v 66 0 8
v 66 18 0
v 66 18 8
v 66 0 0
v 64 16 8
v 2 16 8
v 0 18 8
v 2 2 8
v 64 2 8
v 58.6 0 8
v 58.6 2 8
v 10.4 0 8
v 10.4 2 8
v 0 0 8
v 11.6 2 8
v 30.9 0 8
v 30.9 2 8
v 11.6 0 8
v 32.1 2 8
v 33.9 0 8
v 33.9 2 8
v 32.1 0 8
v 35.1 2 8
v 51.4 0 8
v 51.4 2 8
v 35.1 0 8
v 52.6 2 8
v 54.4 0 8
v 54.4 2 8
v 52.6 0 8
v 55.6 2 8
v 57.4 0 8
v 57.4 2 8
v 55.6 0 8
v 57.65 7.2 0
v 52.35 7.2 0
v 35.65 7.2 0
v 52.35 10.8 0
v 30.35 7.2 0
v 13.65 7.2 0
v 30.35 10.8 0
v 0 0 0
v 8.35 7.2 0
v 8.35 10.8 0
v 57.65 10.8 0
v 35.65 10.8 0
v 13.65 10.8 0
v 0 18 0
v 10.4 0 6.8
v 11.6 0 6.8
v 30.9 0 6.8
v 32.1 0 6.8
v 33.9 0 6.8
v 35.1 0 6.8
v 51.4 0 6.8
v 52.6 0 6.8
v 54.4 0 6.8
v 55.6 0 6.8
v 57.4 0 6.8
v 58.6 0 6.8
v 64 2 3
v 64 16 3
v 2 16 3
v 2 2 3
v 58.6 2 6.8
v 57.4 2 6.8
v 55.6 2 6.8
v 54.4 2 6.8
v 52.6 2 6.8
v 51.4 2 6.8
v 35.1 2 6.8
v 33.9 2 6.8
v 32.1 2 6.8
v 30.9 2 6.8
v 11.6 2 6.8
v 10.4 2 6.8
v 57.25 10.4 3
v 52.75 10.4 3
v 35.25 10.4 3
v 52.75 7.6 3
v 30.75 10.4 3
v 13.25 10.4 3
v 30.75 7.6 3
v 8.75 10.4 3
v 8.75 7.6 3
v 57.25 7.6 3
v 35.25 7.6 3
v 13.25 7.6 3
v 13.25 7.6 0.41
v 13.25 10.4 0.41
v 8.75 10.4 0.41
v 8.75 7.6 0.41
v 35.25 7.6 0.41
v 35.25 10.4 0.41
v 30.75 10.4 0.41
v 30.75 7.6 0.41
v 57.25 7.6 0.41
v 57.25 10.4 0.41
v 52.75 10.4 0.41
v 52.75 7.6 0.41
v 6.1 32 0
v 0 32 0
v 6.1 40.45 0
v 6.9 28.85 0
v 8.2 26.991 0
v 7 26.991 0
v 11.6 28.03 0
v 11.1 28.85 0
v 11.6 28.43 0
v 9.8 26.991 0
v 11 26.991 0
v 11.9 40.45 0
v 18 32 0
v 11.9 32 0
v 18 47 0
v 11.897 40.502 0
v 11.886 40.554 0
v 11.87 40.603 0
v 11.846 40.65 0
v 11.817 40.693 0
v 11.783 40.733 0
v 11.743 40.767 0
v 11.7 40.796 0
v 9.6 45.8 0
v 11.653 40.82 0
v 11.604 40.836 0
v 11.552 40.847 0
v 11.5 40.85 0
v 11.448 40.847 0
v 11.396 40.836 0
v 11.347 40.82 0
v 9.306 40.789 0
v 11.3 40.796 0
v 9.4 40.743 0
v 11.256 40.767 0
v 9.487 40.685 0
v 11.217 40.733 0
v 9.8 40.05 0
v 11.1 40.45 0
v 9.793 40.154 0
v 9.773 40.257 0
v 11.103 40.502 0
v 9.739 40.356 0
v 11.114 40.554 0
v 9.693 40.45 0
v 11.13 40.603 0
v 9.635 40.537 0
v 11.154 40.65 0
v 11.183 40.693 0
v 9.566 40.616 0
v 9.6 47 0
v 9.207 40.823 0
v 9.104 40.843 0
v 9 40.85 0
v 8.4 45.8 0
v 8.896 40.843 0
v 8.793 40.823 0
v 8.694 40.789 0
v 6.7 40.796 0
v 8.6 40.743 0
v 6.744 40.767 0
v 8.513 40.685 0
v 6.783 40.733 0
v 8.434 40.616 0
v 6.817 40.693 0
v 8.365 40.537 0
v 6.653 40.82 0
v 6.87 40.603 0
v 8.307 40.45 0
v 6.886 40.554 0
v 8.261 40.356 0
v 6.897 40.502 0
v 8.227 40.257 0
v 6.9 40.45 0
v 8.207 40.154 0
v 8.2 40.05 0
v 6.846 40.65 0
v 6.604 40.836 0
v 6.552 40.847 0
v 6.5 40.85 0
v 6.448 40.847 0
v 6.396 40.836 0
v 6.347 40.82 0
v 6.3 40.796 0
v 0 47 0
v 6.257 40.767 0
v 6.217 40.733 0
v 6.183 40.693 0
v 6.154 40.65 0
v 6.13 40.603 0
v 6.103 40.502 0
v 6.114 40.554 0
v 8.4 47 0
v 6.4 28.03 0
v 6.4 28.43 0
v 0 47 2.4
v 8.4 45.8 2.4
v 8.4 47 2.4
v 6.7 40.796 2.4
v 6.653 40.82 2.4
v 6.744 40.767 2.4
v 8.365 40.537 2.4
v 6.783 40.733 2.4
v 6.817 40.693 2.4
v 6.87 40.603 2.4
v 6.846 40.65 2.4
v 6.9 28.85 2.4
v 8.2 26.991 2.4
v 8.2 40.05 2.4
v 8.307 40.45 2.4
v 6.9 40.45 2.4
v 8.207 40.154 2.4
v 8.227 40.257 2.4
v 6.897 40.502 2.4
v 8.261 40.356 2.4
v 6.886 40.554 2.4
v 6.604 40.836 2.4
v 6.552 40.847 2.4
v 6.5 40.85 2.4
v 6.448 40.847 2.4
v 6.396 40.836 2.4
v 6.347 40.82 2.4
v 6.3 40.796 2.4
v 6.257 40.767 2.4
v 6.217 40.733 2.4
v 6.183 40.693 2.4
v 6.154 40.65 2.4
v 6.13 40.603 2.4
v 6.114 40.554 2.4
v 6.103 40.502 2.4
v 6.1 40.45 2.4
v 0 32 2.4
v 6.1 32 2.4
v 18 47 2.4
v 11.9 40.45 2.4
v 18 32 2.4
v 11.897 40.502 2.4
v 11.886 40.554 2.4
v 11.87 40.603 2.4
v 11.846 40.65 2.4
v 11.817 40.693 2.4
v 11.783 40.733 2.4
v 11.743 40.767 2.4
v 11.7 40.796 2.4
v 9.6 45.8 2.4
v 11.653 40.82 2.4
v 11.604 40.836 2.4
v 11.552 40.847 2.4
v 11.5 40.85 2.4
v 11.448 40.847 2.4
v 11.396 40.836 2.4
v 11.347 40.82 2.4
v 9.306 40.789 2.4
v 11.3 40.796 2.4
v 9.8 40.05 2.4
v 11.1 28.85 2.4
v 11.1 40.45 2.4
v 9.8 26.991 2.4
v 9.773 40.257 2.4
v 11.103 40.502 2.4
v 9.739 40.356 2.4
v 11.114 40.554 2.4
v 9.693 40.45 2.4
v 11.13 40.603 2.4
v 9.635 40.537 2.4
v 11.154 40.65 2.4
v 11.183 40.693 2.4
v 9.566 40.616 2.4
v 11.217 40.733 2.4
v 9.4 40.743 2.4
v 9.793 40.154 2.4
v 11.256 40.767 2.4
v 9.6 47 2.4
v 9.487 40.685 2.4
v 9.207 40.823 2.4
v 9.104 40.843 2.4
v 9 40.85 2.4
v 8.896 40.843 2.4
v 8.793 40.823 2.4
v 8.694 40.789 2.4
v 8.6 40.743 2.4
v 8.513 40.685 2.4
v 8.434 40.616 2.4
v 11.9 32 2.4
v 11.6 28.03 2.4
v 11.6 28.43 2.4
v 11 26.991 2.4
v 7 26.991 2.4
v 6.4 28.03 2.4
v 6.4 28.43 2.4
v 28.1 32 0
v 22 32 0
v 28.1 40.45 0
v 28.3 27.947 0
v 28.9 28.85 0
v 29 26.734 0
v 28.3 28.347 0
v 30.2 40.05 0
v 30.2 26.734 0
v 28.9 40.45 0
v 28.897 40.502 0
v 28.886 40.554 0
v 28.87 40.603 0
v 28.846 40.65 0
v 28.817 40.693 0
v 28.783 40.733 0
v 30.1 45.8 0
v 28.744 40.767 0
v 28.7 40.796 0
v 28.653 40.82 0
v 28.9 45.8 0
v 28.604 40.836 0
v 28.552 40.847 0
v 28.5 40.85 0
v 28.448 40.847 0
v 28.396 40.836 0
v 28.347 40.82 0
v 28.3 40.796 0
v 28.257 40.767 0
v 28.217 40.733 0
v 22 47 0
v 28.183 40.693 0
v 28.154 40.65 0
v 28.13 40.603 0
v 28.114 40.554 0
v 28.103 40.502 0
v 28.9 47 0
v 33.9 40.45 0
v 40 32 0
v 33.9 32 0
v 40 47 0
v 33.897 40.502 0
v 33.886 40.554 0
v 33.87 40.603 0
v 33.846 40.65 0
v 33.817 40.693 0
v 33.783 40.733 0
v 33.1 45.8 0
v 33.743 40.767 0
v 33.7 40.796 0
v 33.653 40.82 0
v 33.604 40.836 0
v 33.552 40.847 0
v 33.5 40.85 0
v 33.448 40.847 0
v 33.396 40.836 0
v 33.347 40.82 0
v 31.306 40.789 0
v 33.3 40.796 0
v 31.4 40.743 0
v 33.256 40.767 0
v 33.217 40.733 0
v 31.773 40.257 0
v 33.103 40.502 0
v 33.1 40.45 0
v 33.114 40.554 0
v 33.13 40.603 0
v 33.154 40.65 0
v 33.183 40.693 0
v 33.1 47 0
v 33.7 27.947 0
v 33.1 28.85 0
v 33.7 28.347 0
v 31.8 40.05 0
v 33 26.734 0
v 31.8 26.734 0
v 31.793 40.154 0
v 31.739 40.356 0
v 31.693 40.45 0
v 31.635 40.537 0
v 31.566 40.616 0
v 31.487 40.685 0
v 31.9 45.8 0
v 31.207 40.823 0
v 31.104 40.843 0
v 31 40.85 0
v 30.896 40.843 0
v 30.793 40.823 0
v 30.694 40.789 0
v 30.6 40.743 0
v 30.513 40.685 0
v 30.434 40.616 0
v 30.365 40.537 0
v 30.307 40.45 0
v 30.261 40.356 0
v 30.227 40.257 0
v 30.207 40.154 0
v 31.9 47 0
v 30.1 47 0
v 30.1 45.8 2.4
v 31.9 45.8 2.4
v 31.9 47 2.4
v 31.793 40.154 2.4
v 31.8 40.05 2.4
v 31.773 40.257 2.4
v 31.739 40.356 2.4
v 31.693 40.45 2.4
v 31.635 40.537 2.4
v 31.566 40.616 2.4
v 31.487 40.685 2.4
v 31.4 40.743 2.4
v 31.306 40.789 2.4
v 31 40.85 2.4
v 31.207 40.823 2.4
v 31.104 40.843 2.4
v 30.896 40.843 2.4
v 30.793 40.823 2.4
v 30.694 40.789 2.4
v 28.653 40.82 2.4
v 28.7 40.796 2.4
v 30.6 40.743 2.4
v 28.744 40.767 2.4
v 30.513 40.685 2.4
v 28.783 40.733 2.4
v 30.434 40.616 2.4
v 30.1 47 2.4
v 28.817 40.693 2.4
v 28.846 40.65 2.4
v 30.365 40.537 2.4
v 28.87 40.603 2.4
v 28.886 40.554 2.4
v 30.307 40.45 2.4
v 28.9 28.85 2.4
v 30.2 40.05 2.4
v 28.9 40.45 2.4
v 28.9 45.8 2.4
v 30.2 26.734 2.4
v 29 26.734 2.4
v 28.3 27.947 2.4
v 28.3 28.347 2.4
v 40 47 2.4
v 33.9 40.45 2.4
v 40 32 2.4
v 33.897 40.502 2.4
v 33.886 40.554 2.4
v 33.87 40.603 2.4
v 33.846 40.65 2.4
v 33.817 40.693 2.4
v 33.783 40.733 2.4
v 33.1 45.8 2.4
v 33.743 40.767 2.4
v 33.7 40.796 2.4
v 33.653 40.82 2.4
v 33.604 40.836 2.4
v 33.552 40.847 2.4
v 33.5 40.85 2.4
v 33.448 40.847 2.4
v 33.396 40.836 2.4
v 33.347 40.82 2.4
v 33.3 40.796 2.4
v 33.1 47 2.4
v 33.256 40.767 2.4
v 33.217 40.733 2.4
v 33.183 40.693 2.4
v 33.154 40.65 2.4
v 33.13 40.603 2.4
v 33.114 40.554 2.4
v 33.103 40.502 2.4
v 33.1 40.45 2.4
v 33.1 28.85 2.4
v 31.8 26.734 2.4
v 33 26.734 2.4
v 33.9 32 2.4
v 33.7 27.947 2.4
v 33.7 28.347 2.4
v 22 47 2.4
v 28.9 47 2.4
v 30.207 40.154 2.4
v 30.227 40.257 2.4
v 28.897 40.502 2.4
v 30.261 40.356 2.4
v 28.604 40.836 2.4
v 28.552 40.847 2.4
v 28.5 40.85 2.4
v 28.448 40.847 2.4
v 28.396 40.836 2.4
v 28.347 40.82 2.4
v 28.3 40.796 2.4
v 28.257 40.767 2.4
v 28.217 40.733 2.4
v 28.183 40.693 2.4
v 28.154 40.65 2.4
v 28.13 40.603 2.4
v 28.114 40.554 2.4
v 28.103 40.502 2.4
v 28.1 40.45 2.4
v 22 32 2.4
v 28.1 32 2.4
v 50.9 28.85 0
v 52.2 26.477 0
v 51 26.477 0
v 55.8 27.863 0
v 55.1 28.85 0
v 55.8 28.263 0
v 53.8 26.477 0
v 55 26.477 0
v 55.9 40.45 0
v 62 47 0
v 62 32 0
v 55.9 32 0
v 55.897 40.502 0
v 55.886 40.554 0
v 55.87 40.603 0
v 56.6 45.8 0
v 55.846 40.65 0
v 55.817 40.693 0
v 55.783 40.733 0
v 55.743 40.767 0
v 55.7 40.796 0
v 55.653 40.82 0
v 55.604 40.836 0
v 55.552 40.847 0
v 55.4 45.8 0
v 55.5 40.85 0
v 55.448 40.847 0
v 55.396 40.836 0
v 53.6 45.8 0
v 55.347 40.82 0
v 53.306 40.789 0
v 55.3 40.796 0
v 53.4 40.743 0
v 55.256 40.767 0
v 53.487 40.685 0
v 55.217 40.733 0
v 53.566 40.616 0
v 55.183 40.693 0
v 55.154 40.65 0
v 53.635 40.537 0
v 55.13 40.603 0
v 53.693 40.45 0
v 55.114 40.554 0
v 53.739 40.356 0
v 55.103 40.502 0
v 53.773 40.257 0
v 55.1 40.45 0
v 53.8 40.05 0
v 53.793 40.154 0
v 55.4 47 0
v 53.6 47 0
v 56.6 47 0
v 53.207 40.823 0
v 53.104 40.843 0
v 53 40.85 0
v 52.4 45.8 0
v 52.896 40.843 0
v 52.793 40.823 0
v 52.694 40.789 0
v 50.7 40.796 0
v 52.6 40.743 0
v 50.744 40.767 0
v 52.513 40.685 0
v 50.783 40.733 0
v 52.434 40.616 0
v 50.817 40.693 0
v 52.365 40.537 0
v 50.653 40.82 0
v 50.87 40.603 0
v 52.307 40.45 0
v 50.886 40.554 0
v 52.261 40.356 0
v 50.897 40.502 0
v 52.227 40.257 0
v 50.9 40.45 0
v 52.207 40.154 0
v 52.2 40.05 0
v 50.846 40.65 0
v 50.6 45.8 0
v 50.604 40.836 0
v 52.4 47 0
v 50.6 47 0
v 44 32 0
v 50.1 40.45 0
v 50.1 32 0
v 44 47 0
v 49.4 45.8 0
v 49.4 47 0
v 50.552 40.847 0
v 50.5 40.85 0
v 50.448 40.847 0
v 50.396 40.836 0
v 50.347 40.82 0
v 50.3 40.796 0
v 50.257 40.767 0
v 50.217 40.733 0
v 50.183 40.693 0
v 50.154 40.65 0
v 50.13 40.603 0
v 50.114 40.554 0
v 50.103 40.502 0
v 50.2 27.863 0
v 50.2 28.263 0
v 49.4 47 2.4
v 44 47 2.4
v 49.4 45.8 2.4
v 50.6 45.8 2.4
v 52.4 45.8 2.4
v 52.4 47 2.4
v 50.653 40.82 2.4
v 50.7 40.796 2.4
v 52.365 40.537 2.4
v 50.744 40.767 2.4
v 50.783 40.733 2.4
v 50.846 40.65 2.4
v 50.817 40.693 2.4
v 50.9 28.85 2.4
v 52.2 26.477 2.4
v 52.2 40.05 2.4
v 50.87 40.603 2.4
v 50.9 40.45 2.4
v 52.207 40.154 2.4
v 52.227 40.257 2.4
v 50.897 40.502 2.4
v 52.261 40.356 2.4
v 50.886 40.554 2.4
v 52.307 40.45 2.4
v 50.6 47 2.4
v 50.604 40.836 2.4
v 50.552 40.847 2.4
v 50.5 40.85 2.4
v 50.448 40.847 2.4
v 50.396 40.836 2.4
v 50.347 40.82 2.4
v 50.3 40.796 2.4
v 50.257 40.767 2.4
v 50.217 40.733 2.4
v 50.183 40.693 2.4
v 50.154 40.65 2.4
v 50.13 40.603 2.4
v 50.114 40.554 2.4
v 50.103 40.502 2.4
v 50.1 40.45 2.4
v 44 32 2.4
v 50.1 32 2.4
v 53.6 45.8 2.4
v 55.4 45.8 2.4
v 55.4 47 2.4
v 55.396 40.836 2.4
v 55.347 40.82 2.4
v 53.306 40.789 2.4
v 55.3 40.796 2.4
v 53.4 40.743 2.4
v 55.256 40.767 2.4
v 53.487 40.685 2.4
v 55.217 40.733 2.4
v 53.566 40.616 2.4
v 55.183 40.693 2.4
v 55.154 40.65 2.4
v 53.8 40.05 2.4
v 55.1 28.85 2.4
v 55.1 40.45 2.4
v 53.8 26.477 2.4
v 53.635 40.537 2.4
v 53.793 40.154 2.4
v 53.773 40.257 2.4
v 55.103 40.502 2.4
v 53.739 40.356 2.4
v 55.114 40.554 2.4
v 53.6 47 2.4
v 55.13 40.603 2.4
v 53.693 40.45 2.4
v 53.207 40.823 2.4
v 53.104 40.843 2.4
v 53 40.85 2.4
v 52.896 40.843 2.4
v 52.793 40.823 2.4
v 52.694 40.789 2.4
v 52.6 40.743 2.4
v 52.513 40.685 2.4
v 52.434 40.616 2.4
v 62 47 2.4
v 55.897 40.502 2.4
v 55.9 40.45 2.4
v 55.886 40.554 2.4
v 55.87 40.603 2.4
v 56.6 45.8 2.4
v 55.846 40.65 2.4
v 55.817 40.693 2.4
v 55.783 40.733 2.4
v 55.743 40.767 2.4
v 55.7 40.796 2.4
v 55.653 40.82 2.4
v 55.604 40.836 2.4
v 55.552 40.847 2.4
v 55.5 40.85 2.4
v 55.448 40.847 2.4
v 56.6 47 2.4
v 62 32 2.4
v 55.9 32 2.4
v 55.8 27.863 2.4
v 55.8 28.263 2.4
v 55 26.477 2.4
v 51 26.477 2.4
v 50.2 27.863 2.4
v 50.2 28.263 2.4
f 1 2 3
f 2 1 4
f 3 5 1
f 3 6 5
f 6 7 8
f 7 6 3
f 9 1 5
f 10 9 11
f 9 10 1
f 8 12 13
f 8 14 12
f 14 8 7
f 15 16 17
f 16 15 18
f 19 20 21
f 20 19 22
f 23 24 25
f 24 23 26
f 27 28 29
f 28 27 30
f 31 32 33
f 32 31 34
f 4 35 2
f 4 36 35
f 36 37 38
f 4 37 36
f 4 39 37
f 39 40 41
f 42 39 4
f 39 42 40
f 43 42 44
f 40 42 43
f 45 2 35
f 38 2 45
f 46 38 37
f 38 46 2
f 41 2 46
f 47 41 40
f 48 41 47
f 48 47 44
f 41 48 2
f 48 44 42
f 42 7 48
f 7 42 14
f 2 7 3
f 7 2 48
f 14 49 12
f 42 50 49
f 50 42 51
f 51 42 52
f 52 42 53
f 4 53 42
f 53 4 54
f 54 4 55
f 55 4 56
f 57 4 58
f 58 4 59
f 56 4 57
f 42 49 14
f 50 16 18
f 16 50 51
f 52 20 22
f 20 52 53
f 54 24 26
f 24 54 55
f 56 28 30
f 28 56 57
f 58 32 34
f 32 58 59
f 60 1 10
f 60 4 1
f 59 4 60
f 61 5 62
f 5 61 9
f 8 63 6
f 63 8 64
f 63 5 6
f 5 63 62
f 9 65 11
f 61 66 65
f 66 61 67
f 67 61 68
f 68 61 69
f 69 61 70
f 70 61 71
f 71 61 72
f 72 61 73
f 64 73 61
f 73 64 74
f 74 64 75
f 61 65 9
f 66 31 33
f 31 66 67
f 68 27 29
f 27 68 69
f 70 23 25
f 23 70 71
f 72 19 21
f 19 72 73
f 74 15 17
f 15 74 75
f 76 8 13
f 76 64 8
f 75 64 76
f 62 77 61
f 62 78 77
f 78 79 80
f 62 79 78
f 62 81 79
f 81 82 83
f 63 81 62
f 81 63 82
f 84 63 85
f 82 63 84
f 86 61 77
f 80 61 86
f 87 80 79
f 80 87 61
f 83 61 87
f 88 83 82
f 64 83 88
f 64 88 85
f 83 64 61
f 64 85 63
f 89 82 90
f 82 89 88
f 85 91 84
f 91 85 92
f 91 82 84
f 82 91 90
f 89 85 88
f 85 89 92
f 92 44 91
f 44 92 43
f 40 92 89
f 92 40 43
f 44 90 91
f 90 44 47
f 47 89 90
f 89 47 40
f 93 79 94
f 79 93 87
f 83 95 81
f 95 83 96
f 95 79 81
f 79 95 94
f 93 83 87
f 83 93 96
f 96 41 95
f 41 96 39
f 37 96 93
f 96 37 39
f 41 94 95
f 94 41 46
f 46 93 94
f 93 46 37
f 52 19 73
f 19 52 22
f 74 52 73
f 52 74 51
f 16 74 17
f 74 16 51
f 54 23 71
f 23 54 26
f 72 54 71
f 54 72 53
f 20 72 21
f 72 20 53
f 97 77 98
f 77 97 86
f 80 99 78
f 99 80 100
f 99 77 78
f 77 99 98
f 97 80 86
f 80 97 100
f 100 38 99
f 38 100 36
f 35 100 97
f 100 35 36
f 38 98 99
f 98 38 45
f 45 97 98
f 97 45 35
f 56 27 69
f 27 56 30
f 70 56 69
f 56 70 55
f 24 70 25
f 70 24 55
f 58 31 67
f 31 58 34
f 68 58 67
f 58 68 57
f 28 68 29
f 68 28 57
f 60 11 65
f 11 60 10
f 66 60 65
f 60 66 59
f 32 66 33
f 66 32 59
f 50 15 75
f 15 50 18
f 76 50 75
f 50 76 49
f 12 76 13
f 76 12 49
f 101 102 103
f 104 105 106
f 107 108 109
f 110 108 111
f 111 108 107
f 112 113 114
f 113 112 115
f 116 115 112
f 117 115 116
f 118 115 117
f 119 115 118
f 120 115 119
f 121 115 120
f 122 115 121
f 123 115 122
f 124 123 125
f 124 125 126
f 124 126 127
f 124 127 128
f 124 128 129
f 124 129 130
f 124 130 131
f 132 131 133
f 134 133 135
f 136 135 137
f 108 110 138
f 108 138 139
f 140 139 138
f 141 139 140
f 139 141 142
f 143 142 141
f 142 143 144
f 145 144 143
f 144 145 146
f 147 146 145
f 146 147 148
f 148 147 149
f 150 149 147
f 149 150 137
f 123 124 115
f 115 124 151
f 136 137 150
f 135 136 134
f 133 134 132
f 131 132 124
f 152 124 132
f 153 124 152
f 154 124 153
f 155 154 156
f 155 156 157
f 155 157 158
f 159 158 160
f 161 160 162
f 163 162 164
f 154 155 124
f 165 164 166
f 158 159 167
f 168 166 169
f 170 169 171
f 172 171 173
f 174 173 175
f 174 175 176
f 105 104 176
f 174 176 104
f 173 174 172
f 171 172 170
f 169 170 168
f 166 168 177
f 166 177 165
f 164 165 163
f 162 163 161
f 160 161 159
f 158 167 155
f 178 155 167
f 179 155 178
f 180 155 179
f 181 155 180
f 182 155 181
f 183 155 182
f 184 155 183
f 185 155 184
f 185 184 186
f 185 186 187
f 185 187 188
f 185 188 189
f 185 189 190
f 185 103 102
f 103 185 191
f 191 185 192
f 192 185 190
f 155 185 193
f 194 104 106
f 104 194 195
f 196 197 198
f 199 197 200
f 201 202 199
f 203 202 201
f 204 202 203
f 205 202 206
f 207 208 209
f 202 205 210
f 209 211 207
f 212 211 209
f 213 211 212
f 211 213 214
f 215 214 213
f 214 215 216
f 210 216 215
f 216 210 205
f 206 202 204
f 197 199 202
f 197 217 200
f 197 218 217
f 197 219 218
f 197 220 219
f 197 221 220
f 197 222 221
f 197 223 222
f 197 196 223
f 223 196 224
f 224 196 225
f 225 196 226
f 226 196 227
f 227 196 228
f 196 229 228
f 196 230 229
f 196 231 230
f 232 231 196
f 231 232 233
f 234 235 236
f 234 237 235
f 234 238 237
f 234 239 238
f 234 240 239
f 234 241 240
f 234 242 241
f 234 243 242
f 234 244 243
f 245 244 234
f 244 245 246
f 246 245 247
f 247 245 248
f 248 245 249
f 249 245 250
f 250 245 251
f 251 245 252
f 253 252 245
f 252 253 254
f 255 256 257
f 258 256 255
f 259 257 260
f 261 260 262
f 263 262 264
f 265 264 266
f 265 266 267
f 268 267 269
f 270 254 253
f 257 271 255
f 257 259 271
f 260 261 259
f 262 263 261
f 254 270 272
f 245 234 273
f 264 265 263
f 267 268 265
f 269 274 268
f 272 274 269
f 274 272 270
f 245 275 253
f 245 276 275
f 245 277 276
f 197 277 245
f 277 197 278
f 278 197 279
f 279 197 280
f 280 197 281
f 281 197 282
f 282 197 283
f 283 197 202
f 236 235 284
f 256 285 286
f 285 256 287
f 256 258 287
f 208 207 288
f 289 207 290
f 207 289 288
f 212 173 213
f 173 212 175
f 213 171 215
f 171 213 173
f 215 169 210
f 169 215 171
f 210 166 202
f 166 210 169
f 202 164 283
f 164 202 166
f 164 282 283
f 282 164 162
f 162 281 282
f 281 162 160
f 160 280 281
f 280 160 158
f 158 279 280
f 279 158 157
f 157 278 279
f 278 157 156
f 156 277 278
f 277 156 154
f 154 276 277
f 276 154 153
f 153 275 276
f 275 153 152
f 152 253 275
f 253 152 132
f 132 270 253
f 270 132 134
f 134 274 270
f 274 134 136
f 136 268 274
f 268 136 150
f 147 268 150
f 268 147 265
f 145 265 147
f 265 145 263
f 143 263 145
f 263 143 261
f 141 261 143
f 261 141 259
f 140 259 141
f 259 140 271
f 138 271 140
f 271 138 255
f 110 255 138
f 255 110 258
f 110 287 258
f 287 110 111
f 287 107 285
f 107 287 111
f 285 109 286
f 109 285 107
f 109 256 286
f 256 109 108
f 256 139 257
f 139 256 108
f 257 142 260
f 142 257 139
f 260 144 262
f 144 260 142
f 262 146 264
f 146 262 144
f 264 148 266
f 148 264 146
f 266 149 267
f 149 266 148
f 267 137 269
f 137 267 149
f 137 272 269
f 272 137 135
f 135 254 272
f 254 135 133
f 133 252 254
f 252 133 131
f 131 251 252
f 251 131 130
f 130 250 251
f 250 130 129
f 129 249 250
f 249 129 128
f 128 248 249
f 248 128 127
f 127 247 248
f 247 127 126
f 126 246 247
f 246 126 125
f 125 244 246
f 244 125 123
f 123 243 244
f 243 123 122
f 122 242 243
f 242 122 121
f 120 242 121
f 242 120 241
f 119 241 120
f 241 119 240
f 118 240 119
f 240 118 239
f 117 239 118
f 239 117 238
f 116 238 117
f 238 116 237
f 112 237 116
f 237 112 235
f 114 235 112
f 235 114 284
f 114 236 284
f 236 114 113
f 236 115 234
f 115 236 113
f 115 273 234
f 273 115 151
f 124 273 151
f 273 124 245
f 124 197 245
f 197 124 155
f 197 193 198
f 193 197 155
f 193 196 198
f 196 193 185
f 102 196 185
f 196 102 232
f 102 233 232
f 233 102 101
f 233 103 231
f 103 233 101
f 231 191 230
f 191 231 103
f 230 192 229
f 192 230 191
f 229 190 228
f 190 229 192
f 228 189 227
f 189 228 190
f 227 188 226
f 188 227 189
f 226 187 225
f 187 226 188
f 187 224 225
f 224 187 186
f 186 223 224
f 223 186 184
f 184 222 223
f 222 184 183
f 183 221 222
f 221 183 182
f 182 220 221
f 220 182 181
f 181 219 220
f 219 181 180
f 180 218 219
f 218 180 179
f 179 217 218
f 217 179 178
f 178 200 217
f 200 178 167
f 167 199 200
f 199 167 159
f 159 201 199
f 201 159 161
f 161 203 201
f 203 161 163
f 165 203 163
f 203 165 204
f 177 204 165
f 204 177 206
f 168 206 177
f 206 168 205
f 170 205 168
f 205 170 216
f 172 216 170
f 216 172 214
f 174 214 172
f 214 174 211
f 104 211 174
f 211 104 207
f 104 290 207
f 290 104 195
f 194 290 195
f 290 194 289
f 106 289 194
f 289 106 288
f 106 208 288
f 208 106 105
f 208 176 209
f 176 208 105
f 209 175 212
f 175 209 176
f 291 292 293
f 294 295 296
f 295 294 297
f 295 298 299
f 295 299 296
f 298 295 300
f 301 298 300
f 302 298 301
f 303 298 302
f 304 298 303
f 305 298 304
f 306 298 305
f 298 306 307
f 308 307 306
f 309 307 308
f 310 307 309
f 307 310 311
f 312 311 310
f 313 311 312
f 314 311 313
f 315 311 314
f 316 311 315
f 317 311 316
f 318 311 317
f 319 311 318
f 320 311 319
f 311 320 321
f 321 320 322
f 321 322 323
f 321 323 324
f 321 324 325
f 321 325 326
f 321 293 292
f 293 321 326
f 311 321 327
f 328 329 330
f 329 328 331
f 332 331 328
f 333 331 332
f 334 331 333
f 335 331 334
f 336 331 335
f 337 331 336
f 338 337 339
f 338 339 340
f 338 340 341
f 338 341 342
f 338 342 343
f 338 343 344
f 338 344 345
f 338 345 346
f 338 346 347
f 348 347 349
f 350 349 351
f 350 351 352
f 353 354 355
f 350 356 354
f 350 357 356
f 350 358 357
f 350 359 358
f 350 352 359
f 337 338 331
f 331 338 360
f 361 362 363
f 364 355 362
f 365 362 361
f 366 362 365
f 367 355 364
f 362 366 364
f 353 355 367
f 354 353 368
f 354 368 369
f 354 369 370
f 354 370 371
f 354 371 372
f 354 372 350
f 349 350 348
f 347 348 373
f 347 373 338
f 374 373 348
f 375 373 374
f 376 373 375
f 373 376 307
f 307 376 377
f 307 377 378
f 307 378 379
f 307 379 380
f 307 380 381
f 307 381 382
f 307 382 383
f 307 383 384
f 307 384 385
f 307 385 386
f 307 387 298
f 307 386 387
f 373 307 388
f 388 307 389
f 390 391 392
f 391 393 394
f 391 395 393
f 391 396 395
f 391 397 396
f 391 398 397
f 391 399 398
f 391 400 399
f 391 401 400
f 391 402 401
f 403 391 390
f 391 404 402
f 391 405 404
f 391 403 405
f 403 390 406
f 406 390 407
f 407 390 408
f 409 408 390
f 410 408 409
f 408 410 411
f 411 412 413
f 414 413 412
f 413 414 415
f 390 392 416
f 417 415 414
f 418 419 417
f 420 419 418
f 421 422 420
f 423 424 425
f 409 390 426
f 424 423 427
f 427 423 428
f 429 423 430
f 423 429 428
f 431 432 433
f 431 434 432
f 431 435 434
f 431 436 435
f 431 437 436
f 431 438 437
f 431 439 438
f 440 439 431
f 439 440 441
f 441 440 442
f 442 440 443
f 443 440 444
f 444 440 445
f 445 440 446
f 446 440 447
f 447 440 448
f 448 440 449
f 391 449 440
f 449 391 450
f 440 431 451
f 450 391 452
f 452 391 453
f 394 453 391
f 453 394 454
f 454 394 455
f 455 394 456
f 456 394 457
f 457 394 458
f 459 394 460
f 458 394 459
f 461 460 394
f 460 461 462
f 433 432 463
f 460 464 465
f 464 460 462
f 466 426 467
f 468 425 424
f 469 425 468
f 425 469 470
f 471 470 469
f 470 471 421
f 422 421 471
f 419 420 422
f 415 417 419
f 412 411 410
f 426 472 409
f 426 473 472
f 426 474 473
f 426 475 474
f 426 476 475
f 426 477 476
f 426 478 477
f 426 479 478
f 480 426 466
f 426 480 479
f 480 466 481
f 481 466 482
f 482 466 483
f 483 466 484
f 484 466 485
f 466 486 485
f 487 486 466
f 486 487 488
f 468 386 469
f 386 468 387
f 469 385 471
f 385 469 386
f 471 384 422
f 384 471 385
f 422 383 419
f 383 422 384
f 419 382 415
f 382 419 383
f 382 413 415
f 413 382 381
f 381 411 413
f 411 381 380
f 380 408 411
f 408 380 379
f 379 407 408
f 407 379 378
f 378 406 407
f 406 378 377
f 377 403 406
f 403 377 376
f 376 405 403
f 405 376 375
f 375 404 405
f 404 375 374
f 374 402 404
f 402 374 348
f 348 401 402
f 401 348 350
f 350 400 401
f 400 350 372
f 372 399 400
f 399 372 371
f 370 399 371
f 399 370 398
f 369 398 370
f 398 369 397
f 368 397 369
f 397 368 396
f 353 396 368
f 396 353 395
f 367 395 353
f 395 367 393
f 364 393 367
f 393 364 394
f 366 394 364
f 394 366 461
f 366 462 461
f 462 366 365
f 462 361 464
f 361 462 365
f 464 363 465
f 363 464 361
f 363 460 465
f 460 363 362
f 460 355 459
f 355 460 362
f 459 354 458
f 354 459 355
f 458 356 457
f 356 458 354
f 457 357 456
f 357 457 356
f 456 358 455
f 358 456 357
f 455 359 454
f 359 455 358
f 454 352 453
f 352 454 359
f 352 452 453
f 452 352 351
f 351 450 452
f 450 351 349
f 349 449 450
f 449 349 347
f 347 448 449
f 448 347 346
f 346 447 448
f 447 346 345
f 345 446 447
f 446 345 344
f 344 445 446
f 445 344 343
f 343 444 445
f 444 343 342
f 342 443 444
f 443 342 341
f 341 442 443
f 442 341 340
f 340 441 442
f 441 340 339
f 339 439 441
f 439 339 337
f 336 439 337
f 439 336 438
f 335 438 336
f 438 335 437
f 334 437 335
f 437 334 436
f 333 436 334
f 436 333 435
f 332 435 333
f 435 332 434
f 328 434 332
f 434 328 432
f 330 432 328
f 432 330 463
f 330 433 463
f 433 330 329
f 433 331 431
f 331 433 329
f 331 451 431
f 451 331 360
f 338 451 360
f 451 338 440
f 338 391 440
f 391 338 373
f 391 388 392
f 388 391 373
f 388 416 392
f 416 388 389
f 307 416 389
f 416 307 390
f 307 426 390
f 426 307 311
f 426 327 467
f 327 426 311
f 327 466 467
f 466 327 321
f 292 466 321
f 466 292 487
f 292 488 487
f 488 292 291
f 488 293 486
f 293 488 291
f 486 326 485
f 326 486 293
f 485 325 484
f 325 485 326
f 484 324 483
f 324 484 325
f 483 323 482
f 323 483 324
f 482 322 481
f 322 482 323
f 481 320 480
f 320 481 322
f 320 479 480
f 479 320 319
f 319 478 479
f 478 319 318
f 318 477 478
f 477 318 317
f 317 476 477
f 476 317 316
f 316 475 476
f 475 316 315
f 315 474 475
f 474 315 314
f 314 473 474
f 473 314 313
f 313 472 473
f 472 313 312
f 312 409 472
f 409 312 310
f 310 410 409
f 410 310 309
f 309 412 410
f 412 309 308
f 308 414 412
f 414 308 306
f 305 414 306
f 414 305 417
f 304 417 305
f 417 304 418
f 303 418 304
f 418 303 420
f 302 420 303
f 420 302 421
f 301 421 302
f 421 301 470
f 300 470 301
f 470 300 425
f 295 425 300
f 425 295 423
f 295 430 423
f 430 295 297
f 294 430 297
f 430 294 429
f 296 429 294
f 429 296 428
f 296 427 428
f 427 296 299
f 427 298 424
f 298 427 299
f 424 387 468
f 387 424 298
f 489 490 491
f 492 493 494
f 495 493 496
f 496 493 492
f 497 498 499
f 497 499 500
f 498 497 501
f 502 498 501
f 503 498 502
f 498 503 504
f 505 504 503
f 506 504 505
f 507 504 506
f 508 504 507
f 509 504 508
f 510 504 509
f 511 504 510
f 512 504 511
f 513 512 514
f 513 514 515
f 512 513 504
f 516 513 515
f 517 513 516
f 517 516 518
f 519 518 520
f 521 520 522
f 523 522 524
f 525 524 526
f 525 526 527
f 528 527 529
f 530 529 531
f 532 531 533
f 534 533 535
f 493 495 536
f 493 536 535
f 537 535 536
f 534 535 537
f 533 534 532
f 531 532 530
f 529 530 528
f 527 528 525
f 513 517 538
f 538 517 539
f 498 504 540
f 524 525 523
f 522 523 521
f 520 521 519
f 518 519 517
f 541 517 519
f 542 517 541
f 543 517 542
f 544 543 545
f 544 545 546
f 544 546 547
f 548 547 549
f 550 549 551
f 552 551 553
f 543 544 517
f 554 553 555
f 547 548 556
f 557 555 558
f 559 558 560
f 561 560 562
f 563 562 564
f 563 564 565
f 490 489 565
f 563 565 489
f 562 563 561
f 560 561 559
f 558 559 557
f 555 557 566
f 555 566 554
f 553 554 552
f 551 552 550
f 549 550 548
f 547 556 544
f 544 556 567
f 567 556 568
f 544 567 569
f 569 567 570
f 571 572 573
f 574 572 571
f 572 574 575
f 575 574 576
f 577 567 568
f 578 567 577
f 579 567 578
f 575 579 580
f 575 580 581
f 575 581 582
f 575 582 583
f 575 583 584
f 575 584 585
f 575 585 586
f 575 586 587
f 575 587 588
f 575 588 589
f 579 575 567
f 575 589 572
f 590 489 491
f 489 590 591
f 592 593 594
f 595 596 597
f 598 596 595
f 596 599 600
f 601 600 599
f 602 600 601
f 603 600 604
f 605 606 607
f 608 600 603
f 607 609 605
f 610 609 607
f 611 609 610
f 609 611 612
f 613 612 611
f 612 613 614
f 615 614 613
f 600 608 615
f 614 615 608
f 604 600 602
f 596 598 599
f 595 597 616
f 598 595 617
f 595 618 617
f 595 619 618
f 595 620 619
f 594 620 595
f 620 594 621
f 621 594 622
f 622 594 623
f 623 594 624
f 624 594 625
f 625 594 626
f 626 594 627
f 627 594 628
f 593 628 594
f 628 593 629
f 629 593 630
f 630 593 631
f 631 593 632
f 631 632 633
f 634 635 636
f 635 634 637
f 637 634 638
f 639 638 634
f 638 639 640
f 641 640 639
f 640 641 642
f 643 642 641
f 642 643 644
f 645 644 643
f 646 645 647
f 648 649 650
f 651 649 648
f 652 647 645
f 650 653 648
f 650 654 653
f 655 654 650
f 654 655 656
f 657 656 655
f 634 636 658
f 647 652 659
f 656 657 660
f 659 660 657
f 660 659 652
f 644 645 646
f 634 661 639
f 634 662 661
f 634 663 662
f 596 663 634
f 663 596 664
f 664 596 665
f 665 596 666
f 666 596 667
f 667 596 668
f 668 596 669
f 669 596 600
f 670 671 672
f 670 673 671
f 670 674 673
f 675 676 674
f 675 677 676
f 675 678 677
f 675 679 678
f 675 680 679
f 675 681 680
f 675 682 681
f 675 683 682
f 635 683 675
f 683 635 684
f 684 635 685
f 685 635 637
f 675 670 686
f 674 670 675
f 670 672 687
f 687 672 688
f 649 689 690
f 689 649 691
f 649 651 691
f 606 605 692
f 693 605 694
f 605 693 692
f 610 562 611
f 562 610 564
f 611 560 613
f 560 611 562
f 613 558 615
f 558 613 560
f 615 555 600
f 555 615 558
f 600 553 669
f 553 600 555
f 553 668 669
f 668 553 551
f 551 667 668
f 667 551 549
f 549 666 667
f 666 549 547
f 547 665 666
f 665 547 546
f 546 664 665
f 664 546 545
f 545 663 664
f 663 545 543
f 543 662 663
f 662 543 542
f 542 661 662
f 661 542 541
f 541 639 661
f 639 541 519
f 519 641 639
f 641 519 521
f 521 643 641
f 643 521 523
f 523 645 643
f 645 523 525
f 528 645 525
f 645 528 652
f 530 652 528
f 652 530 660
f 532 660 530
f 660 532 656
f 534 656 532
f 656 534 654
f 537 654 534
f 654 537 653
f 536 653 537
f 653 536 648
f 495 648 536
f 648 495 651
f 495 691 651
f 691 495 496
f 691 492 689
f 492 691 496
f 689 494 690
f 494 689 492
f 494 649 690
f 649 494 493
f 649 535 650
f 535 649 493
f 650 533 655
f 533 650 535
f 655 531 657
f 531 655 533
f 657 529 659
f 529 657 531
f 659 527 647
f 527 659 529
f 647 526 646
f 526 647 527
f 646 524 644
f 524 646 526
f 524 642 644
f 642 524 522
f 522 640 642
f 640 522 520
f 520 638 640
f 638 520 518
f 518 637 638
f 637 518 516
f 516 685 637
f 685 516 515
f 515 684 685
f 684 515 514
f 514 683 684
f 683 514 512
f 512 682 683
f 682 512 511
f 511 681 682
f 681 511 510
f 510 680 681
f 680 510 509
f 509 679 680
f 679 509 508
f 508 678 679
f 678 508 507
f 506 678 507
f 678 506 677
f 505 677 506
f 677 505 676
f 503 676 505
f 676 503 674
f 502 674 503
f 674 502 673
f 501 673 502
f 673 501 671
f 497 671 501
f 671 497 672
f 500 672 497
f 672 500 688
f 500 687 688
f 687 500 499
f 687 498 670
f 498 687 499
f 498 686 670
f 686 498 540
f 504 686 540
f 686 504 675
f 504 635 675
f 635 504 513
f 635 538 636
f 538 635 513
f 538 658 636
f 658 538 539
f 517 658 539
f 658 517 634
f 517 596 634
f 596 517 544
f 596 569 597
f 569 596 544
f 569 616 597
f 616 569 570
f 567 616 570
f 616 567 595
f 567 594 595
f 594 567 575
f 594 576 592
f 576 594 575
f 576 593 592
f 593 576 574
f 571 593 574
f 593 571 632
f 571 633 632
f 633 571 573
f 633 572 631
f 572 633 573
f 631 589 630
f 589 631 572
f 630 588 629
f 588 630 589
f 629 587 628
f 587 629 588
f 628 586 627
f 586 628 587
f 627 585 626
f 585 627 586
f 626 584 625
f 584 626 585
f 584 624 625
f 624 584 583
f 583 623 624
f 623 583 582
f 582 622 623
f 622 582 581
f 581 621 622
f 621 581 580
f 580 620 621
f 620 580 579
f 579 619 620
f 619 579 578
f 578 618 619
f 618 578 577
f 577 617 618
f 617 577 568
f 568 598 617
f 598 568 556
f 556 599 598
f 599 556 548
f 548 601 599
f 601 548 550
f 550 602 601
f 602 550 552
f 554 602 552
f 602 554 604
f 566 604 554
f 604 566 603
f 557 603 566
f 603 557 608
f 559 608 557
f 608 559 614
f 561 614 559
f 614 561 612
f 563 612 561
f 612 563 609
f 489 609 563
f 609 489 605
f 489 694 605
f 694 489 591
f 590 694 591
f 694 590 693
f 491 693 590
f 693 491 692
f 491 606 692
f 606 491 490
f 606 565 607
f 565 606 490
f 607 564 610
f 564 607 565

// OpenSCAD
// Kit-card A-frame chalet: the snap test print (2026-11-25). Scott picked the A-frame chalet
// (2026-11-17) for the free MakerWorld kit-card pilot; the joint is proven before the chalet
// is built round it (mechanism handbook section 7; numbers in snap_budget.py).
//
// An arrow tab on a panel's edge goes through a slot and springs open under the far face. The
// tab's two prongs are the Pocket Top's beam (1.3 thick, 12 long), cut free inside the panel
// and lying in its plane: the panel prints flat, so they bend along the layers.
//
// The plate: a base strip with three slots (printed floor down, skirt up; in use the skirt
// stands on the table and the prongs' nubs sit inside it), and three panel stubs, one per
// reach. Notches on a stub's top edge and on the skirt beside its slot: one 0.35, two 0.45,
// three 0.55. Any stub fits any slot; the slots are all the same.
//
//   part = plate | base | stub (with which = 0..2) | stubs | assembled (review)

part = "plate";
which = 1;
$fn = 48;

REACH = [0.35, 0.45, 0.55];
P = 2.4;           // panel thickness: the prongs' width
T = 1.3;           // prong thickness, in the bend
L = 12;            // prong length, root to the catch
GAP = 1.6;         // between the prongs: each closes by the reach, 0.55 leaves 0.5
SIDE = 0.8;        // the cut beside each prong, inside the panel
GRIP = 3.0;        // the floor the tab passes through (the chalet's base and roof)
CATCH_CL = 0.15;   // the catch starts this far below the floor's far face
CATCH = 50;        // the catch flank, from the insertion axis
RAMP = 30;         // the lead-in, from the insertion axis
CREST = 0.4;       // the nub's flat top
TIP = 2.0;         // the tab tip: each prong ends 1.2 wide (at 0.8 the gate read it as a sub-floor wall)
SLOT_CL = 0.15;    // slot clearance each side of the prongs
SLOT_T = 0.2;      // and each side of the panel's thickness
MOUTH = 0.4;       // the slot's mouth chamfer, on the base's show face

XO = GAP / 2 + T;                 // a prong's outer face, from the centre
XS = XO + SLOT_CL;                // the slot's half-width
SKIRT = 5.0;                      // under the floor: deeper than the tab below it
WALL = 2.0;
SW = 18; SH = 15;                 // a stub (22 x 18 with a 26 pitch sliced at 32 m: over the 30-minute limit)
PITCH = 22;
BL = 3 * PITCH; BW = 18;          // the base strip

// one prong's outline below the shoulder, right side, for reach r (mirrored for the left)
function prong(r) = let(
    yc = -(GRIP + CATCH_CL),
    yn = yc - (XS + r - XO) / tan(CATCH),              // the nub's crest begins
    yr = yn - CREST,                                    // and ends
    yt = yr - (XS + r - TIP) / tan(RAMP))               // the tip
    [[GAP / 2, 0.01], [XO, 0.01], [XO, yc], [XS + r, yn], [XS + r, yr], [TIP, yt], [GAP / 2, yt]];

module stub2d(i) difference() {
    union() {
        translate([-SW / 2, 0]) square([SW, SH]);
        for (m = [0, 1]) mirror([m, 0]) polygon(prong(REACH[i]));
    }
    // the prongs cut free inside the panel, round-ended at the root
    yr = -(GRIP + CATCH_CL) + L;
    for (cx = [0, -(XO + SIDE / 2), XO + SIDE / 2]) {
        w = cx == 0 ? GAP : SIDE;
        hull() { translate([cx - w / 2, -1]) square([w, 0.01]); translate([cx, yr - w / 2]) circle(d = w); }
    }
    // the variant's notches on the top edge
    for (k = [0 : i]) translate([(k - i / 2) * 3 - 0.6, SH - 1.2]) square([1.2, 2]);
}
module stub(i) linear_extrude(P) stub2d(i);

module slot() {
    translate([-XS, -P / 2 - SLOT_T, -1]) cube([2 * XS, P + 2 * SLOT_T, GRIP + 2]);
    // mouth chamfer on the show face (z = 0 as printed: the bed)
    hull() {
        translate([-XS - MOUTH, -P / 2 - SLOT_T - MOUTH, -0.01]) cube([2 * (XS + MOUTH), P + 2 * (SLOT_T + MOUTH), 0.01]);
        translate([-XS, -P / 2 - SLOT_T, MOUTH]) cube([2 * XS, P + 2 * SLOT_T, 0.01]);
    }
}
// printed show face down: the floor on the bed, the skirt rising from it
module base() difference() {
    union() {
        cube([BL, BW, GRIP]);
        difference() { cube([BL, BW, GRIP + SKIRT]); translate([WALL, WALL, GRIP - 0.01]) cube([BL - 2 * WALL, BW - 2 * WALL, SKIRT + 1]); }
    }
    for (i = [0 : 2]) {
        translate([PITCH / 2 + i * PITCH, BW / 2, 0]) slot();
        // the variant's notches on the skirt's top (the table side in use), beside the slot
        for (k = [0 : i]) translate([PITCH / 2 + i * PITCH + (k - i / 2) * 3 - 0.6, -1, GRIP + SKIRT - 1.2]) cube([1.2, WALL + 2, 2]);
    }
}

if (part == "base") base();
else if (part == "stub") stub(which);
else if (part == "stubs") for (i = [0 : 2]) translate([i * (SW + 6), 0, 0]) stub(i);
else if (part == "plate") {
    base();
    for (i = [0 : 2]) translate([PITCH / 2 + i * PITCH - SW / 2 - 2, BW + 14, 0]) translate([SW / 2, 0, 0]) stub(i);
}
else if (part == "assembled") {
    // in use: the base turned over (show face up), stubs standing in their slots, snapped home
    translate([0, BW, GRIP]) rotate([180, 0, 0]) color("#EDE8DC") base();
    for (i = [0 : 2]) color("#B5651D") translate([PITCH / 2 + i * PITCH, BW / 2, GRIP]) rotate([90, 0, 0]) translate([0, 0, -P / 2]) stub(i);
}
